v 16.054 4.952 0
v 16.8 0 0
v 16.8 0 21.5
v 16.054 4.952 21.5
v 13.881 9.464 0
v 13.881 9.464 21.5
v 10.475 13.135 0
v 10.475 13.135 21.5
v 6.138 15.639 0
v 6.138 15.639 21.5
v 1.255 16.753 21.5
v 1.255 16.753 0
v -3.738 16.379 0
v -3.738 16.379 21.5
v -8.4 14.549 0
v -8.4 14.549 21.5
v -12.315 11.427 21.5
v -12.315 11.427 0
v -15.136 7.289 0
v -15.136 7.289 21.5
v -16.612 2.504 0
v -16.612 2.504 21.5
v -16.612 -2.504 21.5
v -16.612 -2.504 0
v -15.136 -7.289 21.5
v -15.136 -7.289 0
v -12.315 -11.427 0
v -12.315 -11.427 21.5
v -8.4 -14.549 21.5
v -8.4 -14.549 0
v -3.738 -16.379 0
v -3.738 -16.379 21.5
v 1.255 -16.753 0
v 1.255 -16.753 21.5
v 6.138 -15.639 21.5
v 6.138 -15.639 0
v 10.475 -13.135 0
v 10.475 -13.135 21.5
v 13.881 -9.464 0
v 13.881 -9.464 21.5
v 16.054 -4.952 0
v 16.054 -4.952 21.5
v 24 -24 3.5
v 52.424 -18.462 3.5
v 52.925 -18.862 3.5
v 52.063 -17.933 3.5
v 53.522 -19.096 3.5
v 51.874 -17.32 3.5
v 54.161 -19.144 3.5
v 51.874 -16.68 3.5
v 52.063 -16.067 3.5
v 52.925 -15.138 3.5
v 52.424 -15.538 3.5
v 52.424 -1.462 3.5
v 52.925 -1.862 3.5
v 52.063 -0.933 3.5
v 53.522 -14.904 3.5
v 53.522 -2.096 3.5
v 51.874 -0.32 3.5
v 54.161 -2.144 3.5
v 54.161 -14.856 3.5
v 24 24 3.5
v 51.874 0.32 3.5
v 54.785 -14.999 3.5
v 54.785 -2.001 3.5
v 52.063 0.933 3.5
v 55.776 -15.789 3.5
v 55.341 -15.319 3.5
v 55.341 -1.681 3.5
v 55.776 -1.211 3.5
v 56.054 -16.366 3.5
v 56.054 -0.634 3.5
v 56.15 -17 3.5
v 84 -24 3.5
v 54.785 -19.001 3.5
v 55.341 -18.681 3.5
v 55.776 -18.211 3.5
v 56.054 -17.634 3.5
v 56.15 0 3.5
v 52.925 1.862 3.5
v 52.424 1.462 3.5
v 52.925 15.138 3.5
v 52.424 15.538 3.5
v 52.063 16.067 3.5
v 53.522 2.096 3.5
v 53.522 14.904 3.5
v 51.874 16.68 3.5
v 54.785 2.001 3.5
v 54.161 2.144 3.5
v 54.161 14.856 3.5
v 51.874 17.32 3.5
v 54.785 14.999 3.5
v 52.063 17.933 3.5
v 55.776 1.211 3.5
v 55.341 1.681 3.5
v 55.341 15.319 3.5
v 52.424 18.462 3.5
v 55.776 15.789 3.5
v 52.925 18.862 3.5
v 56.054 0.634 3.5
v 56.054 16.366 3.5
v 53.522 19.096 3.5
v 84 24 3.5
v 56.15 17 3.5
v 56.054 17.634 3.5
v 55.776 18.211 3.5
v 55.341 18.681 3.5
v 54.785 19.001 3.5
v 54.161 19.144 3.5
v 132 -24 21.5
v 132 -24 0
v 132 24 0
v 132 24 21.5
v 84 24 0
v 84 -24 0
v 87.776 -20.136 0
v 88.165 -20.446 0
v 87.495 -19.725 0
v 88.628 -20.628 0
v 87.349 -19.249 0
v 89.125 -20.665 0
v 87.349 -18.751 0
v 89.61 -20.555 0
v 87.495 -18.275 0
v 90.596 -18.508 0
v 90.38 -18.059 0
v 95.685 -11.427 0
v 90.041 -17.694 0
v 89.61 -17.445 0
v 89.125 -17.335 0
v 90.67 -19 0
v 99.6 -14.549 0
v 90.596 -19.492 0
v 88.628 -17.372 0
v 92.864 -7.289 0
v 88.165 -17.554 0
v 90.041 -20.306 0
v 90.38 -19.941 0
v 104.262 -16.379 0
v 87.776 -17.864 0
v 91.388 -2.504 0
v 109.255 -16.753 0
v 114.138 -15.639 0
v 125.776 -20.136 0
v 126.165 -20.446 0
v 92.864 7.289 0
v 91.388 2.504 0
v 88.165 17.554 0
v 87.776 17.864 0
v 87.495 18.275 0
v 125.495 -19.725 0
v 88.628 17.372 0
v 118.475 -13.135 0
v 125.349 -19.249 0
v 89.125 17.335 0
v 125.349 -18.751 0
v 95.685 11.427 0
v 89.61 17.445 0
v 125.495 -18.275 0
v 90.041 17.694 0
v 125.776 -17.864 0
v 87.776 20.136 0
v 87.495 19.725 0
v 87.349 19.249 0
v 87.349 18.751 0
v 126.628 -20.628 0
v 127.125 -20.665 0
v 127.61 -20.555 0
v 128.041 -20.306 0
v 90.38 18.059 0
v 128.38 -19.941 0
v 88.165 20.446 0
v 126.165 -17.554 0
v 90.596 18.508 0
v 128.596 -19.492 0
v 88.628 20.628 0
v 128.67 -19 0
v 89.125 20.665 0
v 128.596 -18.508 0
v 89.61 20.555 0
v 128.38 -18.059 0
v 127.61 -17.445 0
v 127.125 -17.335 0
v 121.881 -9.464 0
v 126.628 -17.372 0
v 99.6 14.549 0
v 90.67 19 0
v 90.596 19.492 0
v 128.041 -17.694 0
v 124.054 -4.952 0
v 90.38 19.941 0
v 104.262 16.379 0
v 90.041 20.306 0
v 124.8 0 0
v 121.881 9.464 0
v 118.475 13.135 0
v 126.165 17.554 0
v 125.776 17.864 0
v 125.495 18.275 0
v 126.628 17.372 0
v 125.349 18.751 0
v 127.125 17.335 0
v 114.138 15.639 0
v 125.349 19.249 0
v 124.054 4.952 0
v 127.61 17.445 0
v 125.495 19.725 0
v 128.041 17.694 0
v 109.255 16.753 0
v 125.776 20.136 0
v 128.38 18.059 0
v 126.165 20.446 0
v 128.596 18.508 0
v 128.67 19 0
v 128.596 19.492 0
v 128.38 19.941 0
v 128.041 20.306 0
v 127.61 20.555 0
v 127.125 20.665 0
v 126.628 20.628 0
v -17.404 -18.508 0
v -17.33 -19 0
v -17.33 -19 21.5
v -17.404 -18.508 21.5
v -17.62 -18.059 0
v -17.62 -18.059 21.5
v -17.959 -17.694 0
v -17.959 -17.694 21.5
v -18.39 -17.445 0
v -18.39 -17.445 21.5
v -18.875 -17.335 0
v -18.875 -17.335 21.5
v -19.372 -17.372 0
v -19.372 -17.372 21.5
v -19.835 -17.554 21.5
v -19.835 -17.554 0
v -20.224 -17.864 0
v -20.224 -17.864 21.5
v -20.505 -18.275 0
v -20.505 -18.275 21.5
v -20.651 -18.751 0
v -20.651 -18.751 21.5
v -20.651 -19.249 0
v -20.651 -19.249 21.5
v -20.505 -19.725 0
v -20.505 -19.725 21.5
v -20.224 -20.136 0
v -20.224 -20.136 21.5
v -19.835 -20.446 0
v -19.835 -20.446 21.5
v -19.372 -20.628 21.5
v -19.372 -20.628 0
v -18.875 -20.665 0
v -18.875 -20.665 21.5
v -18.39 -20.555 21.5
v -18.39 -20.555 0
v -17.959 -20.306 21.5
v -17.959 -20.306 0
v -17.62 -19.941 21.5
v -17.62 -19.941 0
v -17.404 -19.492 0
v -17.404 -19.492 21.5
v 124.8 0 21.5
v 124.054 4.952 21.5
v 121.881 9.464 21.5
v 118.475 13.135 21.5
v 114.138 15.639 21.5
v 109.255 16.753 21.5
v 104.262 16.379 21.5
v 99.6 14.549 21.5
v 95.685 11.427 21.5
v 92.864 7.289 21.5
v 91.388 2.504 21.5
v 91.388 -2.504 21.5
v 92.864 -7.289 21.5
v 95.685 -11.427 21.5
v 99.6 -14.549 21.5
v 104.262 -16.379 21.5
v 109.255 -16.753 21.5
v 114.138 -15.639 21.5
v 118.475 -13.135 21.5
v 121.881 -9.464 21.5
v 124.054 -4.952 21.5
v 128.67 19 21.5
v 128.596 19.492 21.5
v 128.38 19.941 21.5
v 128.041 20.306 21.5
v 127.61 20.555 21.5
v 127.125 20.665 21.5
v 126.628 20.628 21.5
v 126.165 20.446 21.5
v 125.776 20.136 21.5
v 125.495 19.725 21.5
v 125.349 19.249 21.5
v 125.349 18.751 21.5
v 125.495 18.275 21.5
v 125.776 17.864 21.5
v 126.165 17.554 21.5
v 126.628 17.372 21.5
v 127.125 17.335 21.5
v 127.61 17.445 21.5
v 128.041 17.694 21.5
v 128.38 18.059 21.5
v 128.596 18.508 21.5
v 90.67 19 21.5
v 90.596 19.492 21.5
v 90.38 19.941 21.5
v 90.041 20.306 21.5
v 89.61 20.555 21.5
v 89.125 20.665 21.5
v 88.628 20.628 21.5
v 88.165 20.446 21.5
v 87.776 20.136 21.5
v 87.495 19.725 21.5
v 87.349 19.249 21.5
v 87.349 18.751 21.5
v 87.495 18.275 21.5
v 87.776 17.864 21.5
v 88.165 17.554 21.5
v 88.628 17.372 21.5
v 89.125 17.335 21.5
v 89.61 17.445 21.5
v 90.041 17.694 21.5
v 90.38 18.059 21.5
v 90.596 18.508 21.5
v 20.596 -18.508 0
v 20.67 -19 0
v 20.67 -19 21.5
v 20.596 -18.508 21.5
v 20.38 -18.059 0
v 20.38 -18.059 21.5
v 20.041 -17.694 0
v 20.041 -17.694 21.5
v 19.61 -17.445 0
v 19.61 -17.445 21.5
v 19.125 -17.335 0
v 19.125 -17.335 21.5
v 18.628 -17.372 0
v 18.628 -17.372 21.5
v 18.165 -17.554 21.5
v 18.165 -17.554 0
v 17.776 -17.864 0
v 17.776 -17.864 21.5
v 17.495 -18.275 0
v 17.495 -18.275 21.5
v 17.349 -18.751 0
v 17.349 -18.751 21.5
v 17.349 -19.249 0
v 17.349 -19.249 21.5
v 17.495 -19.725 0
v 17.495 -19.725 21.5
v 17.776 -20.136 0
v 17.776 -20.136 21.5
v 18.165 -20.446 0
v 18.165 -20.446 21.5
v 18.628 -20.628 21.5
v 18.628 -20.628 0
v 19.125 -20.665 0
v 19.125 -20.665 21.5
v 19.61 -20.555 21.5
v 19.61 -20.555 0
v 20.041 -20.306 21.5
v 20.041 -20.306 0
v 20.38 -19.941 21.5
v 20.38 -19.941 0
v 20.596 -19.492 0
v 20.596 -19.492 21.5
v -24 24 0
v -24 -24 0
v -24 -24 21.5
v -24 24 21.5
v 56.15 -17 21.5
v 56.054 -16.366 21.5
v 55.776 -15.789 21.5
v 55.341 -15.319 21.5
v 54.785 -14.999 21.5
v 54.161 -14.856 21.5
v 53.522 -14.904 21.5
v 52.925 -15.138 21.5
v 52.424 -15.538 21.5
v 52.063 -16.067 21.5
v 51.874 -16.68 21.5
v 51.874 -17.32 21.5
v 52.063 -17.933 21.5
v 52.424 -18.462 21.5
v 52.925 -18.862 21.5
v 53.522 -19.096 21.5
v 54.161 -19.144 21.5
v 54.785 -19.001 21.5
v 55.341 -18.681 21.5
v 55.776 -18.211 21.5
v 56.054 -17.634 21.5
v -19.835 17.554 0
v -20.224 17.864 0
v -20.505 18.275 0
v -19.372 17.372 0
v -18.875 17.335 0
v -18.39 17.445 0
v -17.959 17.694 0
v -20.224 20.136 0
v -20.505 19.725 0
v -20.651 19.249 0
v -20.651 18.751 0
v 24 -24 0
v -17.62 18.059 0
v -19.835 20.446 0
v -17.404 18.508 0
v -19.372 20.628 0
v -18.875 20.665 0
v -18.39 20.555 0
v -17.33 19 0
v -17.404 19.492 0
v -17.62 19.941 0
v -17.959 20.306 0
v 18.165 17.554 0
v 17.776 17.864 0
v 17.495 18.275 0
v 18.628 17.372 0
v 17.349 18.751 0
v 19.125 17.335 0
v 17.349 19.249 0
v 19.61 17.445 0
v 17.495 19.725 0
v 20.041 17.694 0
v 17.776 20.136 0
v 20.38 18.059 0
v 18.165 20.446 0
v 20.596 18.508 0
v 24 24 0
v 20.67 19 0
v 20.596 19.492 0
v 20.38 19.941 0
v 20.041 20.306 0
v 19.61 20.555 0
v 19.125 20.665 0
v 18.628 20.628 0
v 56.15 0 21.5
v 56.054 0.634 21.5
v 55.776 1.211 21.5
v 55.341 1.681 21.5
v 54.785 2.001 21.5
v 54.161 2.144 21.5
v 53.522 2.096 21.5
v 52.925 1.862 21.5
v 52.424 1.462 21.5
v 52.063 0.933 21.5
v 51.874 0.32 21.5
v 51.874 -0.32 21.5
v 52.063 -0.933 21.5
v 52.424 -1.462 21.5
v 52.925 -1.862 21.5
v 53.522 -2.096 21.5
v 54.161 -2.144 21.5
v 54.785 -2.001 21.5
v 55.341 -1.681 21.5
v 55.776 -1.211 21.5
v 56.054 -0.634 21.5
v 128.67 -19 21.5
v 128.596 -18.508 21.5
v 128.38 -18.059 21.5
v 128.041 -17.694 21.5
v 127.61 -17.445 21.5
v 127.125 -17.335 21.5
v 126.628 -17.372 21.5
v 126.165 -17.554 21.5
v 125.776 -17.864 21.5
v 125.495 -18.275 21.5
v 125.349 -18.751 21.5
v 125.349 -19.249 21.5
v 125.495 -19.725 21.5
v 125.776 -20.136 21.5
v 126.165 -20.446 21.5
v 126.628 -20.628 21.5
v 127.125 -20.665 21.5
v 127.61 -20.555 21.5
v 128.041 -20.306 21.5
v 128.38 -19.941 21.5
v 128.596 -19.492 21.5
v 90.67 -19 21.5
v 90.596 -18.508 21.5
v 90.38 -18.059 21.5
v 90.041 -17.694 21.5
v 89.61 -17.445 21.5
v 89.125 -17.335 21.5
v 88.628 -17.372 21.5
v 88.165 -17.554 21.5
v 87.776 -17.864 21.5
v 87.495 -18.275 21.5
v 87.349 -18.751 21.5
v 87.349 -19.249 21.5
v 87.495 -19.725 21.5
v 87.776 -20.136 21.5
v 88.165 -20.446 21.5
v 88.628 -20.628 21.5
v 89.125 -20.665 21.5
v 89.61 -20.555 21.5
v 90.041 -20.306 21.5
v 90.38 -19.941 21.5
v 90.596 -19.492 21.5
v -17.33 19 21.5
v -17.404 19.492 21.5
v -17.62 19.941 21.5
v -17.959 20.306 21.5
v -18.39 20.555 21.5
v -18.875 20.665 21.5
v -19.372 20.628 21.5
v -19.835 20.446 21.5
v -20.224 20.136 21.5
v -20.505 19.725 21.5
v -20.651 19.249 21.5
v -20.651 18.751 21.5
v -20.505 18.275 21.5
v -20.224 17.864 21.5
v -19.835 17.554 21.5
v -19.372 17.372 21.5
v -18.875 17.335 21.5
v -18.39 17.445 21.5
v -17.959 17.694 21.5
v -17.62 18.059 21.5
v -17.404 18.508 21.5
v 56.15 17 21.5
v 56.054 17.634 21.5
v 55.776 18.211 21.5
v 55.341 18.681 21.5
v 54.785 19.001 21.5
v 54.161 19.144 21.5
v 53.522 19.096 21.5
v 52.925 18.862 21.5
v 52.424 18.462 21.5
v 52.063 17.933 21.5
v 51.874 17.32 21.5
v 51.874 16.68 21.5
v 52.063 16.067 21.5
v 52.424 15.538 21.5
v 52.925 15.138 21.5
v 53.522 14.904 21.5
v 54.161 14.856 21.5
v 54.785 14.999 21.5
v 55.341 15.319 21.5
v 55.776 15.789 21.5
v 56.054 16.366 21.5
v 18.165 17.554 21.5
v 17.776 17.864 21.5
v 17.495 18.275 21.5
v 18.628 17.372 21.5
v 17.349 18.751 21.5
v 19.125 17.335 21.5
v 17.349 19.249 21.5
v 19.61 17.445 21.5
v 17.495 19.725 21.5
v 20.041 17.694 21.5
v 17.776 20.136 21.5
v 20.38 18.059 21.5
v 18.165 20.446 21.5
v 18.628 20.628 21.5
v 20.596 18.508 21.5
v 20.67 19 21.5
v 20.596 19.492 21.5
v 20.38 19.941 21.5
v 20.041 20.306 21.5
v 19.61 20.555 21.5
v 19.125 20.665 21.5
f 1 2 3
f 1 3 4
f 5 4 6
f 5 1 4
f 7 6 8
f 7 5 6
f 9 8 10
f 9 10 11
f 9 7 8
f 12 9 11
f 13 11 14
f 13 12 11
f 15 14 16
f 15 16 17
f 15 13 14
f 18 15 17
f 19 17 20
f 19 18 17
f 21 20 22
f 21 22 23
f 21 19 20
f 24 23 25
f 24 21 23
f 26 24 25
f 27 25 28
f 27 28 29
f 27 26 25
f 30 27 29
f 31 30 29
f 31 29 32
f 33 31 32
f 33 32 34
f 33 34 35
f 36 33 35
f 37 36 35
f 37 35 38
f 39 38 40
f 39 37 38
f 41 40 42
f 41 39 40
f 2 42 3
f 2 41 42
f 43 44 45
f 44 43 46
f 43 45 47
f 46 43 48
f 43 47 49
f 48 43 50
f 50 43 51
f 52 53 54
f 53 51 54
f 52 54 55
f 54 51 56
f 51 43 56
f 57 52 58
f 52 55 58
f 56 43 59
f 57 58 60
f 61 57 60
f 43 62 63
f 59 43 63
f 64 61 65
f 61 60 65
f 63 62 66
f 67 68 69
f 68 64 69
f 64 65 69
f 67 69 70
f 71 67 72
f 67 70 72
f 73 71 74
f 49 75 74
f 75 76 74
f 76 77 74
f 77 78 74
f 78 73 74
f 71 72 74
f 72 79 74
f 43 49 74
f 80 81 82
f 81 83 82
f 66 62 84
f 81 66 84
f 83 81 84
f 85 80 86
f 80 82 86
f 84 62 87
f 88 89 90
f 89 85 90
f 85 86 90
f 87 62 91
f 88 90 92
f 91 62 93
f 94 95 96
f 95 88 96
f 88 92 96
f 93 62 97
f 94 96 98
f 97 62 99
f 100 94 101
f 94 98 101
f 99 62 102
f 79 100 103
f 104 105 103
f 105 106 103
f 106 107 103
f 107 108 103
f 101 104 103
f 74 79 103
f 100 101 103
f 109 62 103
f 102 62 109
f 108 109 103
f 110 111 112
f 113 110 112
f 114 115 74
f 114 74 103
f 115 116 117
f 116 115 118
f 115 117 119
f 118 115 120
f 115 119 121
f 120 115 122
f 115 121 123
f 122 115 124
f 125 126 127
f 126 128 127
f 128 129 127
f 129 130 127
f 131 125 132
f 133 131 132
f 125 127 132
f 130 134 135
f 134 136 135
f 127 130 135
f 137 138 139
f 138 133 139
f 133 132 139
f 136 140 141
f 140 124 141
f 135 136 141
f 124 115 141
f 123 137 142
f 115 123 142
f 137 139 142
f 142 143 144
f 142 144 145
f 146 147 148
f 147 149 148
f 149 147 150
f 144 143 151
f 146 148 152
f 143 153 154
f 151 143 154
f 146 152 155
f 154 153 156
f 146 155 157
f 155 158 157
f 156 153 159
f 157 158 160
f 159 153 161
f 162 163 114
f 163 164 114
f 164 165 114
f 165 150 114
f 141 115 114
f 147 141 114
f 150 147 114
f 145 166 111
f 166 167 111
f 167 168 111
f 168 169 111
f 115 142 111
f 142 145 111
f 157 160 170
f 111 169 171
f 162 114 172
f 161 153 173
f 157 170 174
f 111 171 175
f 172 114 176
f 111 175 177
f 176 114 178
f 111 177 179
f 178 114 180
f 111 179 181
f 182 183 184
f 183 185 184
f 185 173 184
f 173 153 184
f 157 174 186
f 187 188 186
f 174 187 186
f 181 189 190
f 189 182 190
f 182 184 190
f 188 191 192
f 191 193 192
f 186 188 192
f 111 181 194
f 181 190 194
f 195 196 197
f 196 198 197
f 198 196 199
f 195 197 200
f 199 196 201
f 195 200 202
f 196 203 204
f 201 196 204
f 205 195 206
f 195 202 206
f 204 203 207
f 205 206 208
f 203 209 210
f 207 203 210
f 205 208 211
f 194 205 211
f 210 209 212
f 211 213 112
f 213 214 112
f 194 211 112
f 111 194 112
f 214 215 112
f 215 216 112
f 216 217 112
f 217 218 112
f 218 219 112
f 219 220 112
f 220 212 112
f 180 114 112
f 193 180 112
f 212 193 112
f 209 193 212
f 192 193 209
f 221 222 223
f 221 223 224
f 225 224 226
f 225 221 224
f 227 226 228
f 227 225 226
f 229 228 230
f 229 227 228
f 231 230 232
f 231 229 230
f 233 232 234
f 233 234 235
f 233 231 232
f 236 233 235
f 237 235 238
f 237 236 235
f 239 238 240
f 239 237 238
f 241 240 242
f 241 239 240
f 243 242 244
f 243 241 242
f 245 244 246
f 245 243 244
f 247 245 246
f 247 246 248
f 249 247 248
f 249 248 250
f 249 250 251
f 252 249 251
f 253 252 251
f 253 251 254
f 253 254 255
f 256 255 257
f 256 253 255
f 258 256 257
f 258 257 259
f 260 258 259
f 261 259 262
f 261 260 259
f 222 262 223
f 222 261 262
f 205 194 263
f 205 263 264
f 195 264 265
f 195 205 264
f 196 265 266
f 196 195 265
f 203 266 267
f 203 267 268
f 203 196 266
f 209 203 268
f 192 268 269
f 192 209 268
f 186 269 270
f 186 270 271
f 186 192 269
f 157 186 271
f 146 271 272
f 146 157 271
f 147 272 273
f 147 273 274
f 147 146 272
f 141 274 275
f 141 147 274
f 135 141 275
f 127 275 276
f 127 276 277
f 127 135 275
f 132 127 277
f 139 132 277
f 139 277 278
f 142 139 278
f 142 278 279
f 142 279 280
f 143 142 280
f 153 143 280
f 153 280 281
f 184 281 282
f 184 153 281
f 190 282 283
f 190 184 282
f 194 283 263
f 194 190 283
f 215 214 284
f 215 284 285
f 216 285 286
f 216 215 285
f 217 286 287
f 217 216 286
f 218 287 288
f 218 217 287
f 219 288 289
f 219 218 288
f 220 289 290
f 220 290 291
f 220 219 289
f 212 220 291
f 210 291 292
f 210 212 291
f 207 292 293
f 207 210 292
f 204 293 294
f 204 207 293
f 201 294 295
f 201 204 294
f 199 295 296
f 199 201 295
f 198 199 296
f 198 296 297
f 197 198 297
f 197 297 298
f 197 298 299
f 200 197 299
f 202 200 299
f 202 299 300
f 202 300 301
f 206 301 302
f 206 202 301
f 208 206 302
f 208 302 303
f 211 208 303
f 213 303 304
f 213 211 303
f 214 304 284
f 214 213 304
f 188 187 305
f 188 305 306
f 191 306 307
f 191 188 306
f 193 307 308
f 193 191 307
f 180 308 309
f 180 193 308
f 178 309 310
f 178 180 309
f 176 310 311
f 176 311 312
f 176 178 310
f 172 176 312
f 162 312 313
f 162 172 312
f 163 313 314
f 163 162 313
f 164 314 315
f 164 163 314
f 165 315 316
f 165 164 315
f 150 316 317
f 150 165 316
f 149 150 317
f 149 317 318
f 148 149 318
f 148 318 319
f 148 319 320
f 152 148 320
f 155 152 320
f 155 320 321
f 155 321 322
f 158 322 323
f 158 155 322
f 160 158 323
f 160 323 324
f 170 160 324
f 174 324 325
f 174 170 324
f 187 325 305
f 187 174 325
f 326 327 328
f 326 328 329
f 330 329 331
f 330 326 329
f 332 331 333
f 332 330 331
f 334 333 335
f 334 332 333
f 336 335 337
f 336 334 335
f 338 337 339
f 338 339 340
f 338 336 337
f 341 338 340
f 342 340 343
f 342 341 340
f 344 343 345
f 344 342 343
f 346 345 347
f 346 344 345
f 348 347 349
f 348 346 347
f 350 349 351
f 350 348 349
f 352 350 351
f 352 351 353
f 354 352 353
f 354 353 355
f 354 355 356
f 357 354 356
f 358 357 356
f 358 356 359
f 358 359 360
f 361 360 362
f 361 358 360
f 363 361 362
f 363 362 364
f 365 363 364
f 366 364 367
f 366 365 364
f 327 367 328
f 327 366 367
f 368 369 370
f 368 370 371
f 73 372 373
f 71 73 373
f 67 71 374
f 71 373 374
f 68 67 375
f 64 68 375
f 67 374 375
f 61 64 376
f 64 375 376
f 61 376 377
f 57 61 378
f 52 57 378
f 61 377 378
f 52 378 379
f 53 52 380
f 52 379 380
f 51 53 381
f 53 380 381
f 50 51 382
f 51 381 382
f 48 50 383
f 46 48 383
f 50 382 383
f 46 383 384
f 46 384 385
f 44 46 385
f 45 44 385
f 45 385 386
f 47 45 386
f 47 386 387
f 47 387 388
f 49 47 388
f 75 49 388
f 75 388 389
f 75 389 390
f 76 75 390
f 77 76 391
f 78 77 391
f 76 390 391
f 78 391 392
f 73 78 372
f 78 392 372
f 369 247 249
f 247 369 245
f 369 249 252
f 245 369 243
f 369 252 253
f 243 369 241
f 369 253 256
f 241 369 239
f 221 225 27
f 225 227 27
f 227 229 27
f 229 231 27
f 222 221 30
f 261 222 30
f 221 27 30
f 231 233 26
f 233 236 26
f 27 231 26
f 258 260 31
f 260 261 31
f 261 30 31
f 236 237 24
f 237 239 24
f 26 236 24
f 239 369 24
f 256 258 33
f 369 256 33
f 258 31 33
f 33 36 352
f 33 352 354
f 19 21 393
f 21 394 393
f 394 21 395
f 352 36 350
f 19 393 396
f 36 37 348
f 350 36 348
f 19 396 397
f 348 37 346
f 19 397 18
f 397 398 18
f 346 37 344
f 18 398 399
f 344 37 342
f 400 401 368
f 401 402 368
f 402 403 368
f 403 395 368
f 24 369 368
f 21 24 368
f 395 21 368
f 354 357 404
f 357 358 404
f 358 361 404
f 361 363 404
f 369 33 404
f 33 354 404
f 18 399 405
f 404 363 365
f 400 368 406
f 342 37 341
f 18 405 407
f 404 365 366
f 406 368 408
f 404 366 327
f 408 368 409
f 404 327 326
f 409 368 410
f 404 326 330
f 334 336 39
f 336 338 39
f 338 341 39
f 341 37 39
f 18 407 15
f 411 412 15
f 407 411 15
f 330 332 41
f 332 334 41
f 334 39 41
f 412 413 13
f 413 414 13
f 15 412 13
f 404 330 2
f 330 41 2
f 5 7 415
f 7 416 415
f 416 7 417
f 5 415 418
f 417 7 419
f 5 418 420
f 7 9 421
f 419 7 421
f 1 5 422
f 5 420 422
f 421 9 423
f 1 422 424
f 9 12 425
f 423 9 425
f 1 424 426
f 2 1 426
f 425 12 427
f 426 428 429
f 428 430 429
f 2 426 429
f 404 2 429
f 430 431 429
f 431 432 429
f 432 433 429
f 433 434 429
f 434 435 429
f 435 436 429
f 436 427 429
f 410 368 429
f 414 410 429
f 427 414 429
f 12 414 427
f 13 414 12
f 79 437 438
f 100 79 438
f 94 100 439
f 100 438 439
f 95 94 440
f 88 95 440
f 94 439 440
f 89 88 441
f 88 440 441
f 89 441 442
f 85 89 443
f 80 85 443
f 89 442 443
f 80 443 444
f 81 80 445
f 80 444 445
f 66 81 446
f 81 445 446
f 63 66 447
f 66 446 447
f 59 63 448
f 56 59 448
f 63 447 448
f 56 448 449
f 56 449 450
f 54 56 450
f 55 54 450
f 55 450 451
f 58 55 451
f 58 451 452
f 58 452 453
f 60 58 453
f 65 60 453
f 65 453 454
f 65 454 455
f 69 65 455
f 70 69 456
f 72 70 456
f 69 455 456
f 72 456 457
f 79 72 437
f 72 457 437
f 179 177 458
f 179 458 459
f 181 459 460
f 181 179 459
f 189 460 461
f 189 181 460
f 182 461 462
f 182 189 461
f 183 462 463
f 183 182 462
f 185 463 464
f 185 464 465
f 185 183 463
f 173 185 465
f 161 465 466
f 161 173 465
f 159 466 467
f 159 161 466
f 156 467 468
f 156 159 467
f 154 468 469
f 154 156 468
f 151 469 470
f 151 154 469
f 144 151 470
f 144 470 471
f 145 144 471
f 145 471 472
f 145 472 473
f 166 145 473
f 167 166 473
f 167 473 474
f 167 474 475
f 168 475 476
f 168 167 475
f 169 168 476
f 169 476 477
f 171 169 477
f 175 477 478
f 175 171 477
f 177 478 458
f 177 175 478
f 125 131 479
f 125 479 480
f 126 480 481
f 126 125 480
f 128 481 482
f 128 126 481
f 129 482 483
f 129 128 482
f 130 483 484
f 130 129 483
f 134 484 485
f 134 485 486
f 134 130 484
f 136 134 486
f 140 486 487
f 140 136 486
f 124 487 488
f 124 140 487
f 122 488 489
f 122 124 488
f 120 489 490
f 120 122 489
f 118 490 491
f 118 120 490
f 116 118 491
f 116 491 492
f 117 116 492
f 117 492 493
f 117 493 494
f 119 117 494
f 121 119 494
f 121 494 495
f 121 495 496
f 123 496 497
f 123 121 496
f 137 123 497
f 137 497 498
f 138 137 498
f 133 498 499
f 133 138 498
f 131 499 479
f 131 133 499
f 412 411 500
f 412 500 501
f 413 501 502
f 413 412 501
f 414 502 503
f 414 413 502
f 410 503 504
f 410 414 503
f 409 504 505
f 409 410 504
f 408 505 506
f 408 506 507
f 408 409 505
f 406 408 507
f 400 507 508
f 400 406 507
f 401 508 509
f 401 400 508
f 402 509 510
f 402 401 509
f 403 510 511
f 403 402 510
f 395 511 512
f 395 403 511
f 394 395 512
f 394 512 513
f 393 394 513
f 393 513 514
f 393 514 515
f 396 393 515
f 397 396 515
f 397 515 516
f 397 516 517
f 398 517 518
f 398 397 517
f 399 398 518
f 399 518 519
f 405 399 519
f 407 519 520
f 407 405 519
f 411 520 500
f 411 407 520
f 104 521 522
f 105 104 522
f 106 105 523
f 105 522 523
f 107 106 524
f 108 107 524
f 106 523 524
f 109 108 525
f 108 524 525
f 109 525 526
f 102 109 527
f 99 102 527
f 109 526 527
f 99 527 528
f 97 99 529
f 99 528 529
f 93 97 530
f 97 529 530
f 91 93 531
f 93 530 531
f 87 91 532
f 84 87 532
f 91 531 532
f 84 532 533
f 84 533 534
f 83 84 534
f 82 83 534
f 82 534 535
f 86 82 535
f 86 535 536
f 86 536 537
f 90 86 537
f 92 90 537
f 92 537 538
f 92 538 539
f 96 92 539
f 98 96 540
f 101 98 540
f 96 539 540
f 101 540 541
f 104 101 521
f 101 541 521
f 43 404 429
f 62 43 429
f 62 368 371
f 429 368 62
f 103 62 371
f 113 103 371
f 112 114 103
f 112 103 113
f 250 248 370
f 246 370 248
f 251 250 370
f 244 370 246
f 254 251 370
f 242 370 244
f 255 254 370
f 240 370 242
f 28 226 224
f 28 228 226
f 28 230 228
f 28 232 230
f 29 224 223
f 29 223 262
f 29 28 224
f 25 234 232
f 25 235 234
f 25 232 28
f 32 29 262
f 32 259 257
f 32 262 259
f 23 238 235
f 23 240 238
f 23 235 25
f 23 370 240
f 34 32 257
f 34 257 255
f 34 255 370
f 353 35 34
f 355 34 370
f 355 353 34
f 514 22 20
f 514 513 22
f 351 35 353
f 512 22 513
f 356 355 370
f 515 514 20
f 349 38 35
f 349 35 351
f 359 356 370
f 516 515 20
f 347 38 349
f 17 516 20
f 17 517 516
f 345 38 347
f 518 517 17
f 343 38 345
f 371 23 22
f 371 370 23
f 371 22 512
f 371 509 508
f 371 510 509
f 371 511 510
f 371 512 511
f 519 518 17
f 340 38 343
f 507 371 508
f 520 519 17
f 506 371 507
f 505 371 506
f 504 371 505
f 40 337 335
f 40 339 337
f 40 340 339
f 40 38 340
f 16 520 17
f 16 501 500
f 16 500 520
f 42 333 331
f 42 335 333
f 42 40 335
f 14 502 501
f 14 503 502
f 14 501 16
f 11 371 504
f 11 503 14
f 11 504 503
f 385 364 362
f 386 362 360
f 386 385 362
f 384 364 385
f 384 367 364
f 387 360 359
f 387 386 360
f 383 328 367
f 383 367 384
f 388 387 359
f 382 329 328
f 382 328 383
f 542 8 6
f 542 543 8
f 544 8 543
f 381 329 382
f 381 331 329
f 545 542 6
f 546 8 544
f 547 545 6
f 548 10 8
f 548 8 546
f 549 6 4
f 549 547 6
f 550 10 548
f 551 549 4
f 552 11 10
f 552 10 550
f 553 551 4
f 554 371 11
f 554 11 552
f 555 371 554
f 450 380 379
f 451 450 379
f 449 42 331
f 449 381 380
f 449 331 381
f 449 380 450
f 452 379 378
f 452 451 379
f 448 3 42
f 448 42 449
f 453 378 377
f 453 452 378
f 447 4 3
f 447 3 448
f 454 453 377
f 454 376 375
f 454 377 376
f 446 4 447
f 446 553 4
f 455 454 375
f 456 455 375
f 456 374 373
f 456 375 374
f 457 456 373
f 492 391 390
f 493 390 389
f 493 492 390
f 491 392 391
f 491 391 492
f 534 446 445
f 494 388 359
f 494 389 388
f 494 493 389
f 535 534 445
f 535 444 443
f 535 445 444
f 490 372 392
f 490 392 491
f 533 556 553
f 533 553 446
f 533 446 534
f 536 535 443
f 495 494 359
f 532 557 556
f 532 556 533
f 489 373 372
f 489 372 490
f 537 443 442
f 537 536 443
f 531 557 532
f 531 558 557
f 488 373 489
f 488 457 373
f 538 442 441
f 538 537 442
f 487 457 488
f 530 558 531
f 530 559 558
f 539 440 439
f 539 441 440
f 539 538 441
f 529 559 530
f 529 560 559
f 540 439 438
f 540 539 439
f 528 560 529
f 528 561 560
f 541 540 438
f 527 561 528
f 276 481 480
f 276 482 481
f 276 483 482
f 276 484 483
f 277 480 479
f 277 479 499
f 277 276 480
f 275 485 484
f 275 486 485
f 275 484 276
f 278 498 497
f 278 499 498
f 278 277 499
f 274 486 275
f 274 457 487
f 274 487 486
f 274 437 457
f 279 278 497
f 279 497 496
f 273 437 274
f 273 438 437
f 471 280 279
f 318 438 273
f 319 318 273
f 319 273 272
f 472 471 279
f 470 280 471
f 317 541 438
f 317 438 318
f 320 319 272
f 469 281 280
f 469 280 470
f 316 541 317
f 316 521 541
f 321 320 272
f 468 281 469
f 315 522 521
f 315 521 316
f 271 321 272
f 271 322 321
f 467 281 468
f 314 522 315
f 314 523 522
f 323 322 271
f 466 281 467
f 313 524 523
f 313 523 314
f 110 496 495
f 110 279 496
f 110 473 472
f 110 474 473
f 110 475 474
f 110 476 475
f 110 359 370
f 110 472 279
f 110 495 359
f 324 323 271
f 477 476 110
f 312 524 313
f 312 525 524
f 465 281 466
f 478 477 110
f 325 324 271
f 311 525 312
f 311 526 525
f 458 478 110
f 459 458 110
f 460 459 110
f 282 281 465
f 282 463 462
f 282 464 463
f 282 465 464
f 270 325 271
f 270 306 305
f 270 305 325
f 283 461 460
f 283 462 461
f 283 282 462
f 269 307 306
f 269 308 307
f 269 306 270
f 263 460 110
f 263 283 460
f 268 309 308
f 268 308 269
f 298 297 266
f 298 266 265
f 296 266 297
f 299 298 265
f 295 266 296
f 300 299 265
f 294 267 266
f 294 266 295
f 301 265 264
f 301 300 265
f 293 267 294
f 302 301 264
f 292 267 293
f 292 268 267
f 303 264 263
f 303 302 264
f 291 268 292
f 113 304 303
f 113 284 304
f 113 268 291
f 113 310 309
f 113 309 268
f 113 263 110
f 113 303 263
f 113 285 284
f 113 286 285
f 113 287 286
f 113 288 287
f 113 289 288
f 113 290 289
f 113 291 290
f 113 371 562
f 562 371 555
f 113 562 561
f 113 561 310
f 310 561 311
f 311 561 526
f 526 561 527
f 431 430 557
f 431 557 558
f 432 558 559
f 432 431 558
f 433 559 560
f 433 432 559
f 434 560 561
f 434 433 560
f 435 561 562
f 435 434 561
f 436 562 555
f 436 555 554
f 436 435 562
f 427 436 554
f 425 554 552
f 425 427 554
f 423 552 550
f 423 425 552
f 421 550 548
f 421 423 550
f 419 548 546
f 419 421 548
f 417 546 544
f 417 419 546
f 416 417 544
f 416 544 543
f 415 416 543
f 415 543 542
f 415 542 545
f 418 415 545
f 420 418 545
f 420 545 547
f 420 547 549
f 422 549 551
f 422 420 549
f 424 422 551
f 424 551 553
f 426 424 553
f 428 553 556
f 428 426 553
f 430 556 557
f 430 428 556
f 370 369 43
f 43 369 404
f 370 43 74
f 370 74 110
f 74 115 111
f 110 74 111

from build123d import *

# Parameters (mm, degrees)
SKETCH_1_W             = 48
SKETCH_1_H             = 48
SKETCH_1_R             = 16.8
SKETCH_1_R_2           = 1.67
EXTRUDE_1_DEPTH        = 21.5
SKETCH_3_W             = 60
SKETCH_3_H             = 48
SKETCH_3_R             = 2.15
EXTRUDE_2_DEPTH        = 18
PATTERN_LINEAR_2_COUNT = 2
PATTERN_LINEAR_2_PITCH = 108


with BuildPart() as part:
    # 草图1 → 凸台-拉伸1 (new body)
    with BuildSketch(Plane.XY):
        Rectangle(SKETCH_1_W, SKETCH_1_H)
        Circle(SKETCH_1_R, mode=Mode.SUBTRACT)
        with Locations((-19, 19)):
            Circle(SKETCH_1_R_2, mode=Mode.SUBTRACT)
        with Locations((19, 19)):
            Circle(SKETCH_1_R_2, mode=Mode.SUBTRACT)
        with Locations((19, -19)):
            Circle(SKETCH_1_R_2, mode=Mode.SUBTRACT)
        with Locations((-19, -19)):
            Circle(SKETCH_1_R_2, mode=Mode.SUBTRACT)
    extrude_1 = extrude(amount=EXTRUDE_1_DEPTH)

    # 草图3 → 凸台-拉伸2 (add)
    with BuildSketch(Plane.XY.offset(21.5)):
        with Locations((54, 0)):
            Rectangle(SKETCH_3_W, SKETCH_3_H)
        with Locations((54, 17)):
            Circle(SKETCH_3_R, mode=Mode.SUBTRACT)
        with Locations((54, 0)):
            Circle(SKETCH_3_R, mode=Mode.SUBTRACT)
        with Locations((54, -17)):
            Circle(SKETCH_3_R, mode=Mode.SUBTRACT)
    extrude(amount=-EXTRUDE_2_DEPTH)

    # 阵列(线性)2: 凸台-拉伸1 ×2
    with Locations(*[(i * PATTERN_LINEAR_2_PITCH, 0, 0) for i in range(1, PATTERN_LINEAR_2_COUNT)]):
        add(extrude_1)


solid = part.part
